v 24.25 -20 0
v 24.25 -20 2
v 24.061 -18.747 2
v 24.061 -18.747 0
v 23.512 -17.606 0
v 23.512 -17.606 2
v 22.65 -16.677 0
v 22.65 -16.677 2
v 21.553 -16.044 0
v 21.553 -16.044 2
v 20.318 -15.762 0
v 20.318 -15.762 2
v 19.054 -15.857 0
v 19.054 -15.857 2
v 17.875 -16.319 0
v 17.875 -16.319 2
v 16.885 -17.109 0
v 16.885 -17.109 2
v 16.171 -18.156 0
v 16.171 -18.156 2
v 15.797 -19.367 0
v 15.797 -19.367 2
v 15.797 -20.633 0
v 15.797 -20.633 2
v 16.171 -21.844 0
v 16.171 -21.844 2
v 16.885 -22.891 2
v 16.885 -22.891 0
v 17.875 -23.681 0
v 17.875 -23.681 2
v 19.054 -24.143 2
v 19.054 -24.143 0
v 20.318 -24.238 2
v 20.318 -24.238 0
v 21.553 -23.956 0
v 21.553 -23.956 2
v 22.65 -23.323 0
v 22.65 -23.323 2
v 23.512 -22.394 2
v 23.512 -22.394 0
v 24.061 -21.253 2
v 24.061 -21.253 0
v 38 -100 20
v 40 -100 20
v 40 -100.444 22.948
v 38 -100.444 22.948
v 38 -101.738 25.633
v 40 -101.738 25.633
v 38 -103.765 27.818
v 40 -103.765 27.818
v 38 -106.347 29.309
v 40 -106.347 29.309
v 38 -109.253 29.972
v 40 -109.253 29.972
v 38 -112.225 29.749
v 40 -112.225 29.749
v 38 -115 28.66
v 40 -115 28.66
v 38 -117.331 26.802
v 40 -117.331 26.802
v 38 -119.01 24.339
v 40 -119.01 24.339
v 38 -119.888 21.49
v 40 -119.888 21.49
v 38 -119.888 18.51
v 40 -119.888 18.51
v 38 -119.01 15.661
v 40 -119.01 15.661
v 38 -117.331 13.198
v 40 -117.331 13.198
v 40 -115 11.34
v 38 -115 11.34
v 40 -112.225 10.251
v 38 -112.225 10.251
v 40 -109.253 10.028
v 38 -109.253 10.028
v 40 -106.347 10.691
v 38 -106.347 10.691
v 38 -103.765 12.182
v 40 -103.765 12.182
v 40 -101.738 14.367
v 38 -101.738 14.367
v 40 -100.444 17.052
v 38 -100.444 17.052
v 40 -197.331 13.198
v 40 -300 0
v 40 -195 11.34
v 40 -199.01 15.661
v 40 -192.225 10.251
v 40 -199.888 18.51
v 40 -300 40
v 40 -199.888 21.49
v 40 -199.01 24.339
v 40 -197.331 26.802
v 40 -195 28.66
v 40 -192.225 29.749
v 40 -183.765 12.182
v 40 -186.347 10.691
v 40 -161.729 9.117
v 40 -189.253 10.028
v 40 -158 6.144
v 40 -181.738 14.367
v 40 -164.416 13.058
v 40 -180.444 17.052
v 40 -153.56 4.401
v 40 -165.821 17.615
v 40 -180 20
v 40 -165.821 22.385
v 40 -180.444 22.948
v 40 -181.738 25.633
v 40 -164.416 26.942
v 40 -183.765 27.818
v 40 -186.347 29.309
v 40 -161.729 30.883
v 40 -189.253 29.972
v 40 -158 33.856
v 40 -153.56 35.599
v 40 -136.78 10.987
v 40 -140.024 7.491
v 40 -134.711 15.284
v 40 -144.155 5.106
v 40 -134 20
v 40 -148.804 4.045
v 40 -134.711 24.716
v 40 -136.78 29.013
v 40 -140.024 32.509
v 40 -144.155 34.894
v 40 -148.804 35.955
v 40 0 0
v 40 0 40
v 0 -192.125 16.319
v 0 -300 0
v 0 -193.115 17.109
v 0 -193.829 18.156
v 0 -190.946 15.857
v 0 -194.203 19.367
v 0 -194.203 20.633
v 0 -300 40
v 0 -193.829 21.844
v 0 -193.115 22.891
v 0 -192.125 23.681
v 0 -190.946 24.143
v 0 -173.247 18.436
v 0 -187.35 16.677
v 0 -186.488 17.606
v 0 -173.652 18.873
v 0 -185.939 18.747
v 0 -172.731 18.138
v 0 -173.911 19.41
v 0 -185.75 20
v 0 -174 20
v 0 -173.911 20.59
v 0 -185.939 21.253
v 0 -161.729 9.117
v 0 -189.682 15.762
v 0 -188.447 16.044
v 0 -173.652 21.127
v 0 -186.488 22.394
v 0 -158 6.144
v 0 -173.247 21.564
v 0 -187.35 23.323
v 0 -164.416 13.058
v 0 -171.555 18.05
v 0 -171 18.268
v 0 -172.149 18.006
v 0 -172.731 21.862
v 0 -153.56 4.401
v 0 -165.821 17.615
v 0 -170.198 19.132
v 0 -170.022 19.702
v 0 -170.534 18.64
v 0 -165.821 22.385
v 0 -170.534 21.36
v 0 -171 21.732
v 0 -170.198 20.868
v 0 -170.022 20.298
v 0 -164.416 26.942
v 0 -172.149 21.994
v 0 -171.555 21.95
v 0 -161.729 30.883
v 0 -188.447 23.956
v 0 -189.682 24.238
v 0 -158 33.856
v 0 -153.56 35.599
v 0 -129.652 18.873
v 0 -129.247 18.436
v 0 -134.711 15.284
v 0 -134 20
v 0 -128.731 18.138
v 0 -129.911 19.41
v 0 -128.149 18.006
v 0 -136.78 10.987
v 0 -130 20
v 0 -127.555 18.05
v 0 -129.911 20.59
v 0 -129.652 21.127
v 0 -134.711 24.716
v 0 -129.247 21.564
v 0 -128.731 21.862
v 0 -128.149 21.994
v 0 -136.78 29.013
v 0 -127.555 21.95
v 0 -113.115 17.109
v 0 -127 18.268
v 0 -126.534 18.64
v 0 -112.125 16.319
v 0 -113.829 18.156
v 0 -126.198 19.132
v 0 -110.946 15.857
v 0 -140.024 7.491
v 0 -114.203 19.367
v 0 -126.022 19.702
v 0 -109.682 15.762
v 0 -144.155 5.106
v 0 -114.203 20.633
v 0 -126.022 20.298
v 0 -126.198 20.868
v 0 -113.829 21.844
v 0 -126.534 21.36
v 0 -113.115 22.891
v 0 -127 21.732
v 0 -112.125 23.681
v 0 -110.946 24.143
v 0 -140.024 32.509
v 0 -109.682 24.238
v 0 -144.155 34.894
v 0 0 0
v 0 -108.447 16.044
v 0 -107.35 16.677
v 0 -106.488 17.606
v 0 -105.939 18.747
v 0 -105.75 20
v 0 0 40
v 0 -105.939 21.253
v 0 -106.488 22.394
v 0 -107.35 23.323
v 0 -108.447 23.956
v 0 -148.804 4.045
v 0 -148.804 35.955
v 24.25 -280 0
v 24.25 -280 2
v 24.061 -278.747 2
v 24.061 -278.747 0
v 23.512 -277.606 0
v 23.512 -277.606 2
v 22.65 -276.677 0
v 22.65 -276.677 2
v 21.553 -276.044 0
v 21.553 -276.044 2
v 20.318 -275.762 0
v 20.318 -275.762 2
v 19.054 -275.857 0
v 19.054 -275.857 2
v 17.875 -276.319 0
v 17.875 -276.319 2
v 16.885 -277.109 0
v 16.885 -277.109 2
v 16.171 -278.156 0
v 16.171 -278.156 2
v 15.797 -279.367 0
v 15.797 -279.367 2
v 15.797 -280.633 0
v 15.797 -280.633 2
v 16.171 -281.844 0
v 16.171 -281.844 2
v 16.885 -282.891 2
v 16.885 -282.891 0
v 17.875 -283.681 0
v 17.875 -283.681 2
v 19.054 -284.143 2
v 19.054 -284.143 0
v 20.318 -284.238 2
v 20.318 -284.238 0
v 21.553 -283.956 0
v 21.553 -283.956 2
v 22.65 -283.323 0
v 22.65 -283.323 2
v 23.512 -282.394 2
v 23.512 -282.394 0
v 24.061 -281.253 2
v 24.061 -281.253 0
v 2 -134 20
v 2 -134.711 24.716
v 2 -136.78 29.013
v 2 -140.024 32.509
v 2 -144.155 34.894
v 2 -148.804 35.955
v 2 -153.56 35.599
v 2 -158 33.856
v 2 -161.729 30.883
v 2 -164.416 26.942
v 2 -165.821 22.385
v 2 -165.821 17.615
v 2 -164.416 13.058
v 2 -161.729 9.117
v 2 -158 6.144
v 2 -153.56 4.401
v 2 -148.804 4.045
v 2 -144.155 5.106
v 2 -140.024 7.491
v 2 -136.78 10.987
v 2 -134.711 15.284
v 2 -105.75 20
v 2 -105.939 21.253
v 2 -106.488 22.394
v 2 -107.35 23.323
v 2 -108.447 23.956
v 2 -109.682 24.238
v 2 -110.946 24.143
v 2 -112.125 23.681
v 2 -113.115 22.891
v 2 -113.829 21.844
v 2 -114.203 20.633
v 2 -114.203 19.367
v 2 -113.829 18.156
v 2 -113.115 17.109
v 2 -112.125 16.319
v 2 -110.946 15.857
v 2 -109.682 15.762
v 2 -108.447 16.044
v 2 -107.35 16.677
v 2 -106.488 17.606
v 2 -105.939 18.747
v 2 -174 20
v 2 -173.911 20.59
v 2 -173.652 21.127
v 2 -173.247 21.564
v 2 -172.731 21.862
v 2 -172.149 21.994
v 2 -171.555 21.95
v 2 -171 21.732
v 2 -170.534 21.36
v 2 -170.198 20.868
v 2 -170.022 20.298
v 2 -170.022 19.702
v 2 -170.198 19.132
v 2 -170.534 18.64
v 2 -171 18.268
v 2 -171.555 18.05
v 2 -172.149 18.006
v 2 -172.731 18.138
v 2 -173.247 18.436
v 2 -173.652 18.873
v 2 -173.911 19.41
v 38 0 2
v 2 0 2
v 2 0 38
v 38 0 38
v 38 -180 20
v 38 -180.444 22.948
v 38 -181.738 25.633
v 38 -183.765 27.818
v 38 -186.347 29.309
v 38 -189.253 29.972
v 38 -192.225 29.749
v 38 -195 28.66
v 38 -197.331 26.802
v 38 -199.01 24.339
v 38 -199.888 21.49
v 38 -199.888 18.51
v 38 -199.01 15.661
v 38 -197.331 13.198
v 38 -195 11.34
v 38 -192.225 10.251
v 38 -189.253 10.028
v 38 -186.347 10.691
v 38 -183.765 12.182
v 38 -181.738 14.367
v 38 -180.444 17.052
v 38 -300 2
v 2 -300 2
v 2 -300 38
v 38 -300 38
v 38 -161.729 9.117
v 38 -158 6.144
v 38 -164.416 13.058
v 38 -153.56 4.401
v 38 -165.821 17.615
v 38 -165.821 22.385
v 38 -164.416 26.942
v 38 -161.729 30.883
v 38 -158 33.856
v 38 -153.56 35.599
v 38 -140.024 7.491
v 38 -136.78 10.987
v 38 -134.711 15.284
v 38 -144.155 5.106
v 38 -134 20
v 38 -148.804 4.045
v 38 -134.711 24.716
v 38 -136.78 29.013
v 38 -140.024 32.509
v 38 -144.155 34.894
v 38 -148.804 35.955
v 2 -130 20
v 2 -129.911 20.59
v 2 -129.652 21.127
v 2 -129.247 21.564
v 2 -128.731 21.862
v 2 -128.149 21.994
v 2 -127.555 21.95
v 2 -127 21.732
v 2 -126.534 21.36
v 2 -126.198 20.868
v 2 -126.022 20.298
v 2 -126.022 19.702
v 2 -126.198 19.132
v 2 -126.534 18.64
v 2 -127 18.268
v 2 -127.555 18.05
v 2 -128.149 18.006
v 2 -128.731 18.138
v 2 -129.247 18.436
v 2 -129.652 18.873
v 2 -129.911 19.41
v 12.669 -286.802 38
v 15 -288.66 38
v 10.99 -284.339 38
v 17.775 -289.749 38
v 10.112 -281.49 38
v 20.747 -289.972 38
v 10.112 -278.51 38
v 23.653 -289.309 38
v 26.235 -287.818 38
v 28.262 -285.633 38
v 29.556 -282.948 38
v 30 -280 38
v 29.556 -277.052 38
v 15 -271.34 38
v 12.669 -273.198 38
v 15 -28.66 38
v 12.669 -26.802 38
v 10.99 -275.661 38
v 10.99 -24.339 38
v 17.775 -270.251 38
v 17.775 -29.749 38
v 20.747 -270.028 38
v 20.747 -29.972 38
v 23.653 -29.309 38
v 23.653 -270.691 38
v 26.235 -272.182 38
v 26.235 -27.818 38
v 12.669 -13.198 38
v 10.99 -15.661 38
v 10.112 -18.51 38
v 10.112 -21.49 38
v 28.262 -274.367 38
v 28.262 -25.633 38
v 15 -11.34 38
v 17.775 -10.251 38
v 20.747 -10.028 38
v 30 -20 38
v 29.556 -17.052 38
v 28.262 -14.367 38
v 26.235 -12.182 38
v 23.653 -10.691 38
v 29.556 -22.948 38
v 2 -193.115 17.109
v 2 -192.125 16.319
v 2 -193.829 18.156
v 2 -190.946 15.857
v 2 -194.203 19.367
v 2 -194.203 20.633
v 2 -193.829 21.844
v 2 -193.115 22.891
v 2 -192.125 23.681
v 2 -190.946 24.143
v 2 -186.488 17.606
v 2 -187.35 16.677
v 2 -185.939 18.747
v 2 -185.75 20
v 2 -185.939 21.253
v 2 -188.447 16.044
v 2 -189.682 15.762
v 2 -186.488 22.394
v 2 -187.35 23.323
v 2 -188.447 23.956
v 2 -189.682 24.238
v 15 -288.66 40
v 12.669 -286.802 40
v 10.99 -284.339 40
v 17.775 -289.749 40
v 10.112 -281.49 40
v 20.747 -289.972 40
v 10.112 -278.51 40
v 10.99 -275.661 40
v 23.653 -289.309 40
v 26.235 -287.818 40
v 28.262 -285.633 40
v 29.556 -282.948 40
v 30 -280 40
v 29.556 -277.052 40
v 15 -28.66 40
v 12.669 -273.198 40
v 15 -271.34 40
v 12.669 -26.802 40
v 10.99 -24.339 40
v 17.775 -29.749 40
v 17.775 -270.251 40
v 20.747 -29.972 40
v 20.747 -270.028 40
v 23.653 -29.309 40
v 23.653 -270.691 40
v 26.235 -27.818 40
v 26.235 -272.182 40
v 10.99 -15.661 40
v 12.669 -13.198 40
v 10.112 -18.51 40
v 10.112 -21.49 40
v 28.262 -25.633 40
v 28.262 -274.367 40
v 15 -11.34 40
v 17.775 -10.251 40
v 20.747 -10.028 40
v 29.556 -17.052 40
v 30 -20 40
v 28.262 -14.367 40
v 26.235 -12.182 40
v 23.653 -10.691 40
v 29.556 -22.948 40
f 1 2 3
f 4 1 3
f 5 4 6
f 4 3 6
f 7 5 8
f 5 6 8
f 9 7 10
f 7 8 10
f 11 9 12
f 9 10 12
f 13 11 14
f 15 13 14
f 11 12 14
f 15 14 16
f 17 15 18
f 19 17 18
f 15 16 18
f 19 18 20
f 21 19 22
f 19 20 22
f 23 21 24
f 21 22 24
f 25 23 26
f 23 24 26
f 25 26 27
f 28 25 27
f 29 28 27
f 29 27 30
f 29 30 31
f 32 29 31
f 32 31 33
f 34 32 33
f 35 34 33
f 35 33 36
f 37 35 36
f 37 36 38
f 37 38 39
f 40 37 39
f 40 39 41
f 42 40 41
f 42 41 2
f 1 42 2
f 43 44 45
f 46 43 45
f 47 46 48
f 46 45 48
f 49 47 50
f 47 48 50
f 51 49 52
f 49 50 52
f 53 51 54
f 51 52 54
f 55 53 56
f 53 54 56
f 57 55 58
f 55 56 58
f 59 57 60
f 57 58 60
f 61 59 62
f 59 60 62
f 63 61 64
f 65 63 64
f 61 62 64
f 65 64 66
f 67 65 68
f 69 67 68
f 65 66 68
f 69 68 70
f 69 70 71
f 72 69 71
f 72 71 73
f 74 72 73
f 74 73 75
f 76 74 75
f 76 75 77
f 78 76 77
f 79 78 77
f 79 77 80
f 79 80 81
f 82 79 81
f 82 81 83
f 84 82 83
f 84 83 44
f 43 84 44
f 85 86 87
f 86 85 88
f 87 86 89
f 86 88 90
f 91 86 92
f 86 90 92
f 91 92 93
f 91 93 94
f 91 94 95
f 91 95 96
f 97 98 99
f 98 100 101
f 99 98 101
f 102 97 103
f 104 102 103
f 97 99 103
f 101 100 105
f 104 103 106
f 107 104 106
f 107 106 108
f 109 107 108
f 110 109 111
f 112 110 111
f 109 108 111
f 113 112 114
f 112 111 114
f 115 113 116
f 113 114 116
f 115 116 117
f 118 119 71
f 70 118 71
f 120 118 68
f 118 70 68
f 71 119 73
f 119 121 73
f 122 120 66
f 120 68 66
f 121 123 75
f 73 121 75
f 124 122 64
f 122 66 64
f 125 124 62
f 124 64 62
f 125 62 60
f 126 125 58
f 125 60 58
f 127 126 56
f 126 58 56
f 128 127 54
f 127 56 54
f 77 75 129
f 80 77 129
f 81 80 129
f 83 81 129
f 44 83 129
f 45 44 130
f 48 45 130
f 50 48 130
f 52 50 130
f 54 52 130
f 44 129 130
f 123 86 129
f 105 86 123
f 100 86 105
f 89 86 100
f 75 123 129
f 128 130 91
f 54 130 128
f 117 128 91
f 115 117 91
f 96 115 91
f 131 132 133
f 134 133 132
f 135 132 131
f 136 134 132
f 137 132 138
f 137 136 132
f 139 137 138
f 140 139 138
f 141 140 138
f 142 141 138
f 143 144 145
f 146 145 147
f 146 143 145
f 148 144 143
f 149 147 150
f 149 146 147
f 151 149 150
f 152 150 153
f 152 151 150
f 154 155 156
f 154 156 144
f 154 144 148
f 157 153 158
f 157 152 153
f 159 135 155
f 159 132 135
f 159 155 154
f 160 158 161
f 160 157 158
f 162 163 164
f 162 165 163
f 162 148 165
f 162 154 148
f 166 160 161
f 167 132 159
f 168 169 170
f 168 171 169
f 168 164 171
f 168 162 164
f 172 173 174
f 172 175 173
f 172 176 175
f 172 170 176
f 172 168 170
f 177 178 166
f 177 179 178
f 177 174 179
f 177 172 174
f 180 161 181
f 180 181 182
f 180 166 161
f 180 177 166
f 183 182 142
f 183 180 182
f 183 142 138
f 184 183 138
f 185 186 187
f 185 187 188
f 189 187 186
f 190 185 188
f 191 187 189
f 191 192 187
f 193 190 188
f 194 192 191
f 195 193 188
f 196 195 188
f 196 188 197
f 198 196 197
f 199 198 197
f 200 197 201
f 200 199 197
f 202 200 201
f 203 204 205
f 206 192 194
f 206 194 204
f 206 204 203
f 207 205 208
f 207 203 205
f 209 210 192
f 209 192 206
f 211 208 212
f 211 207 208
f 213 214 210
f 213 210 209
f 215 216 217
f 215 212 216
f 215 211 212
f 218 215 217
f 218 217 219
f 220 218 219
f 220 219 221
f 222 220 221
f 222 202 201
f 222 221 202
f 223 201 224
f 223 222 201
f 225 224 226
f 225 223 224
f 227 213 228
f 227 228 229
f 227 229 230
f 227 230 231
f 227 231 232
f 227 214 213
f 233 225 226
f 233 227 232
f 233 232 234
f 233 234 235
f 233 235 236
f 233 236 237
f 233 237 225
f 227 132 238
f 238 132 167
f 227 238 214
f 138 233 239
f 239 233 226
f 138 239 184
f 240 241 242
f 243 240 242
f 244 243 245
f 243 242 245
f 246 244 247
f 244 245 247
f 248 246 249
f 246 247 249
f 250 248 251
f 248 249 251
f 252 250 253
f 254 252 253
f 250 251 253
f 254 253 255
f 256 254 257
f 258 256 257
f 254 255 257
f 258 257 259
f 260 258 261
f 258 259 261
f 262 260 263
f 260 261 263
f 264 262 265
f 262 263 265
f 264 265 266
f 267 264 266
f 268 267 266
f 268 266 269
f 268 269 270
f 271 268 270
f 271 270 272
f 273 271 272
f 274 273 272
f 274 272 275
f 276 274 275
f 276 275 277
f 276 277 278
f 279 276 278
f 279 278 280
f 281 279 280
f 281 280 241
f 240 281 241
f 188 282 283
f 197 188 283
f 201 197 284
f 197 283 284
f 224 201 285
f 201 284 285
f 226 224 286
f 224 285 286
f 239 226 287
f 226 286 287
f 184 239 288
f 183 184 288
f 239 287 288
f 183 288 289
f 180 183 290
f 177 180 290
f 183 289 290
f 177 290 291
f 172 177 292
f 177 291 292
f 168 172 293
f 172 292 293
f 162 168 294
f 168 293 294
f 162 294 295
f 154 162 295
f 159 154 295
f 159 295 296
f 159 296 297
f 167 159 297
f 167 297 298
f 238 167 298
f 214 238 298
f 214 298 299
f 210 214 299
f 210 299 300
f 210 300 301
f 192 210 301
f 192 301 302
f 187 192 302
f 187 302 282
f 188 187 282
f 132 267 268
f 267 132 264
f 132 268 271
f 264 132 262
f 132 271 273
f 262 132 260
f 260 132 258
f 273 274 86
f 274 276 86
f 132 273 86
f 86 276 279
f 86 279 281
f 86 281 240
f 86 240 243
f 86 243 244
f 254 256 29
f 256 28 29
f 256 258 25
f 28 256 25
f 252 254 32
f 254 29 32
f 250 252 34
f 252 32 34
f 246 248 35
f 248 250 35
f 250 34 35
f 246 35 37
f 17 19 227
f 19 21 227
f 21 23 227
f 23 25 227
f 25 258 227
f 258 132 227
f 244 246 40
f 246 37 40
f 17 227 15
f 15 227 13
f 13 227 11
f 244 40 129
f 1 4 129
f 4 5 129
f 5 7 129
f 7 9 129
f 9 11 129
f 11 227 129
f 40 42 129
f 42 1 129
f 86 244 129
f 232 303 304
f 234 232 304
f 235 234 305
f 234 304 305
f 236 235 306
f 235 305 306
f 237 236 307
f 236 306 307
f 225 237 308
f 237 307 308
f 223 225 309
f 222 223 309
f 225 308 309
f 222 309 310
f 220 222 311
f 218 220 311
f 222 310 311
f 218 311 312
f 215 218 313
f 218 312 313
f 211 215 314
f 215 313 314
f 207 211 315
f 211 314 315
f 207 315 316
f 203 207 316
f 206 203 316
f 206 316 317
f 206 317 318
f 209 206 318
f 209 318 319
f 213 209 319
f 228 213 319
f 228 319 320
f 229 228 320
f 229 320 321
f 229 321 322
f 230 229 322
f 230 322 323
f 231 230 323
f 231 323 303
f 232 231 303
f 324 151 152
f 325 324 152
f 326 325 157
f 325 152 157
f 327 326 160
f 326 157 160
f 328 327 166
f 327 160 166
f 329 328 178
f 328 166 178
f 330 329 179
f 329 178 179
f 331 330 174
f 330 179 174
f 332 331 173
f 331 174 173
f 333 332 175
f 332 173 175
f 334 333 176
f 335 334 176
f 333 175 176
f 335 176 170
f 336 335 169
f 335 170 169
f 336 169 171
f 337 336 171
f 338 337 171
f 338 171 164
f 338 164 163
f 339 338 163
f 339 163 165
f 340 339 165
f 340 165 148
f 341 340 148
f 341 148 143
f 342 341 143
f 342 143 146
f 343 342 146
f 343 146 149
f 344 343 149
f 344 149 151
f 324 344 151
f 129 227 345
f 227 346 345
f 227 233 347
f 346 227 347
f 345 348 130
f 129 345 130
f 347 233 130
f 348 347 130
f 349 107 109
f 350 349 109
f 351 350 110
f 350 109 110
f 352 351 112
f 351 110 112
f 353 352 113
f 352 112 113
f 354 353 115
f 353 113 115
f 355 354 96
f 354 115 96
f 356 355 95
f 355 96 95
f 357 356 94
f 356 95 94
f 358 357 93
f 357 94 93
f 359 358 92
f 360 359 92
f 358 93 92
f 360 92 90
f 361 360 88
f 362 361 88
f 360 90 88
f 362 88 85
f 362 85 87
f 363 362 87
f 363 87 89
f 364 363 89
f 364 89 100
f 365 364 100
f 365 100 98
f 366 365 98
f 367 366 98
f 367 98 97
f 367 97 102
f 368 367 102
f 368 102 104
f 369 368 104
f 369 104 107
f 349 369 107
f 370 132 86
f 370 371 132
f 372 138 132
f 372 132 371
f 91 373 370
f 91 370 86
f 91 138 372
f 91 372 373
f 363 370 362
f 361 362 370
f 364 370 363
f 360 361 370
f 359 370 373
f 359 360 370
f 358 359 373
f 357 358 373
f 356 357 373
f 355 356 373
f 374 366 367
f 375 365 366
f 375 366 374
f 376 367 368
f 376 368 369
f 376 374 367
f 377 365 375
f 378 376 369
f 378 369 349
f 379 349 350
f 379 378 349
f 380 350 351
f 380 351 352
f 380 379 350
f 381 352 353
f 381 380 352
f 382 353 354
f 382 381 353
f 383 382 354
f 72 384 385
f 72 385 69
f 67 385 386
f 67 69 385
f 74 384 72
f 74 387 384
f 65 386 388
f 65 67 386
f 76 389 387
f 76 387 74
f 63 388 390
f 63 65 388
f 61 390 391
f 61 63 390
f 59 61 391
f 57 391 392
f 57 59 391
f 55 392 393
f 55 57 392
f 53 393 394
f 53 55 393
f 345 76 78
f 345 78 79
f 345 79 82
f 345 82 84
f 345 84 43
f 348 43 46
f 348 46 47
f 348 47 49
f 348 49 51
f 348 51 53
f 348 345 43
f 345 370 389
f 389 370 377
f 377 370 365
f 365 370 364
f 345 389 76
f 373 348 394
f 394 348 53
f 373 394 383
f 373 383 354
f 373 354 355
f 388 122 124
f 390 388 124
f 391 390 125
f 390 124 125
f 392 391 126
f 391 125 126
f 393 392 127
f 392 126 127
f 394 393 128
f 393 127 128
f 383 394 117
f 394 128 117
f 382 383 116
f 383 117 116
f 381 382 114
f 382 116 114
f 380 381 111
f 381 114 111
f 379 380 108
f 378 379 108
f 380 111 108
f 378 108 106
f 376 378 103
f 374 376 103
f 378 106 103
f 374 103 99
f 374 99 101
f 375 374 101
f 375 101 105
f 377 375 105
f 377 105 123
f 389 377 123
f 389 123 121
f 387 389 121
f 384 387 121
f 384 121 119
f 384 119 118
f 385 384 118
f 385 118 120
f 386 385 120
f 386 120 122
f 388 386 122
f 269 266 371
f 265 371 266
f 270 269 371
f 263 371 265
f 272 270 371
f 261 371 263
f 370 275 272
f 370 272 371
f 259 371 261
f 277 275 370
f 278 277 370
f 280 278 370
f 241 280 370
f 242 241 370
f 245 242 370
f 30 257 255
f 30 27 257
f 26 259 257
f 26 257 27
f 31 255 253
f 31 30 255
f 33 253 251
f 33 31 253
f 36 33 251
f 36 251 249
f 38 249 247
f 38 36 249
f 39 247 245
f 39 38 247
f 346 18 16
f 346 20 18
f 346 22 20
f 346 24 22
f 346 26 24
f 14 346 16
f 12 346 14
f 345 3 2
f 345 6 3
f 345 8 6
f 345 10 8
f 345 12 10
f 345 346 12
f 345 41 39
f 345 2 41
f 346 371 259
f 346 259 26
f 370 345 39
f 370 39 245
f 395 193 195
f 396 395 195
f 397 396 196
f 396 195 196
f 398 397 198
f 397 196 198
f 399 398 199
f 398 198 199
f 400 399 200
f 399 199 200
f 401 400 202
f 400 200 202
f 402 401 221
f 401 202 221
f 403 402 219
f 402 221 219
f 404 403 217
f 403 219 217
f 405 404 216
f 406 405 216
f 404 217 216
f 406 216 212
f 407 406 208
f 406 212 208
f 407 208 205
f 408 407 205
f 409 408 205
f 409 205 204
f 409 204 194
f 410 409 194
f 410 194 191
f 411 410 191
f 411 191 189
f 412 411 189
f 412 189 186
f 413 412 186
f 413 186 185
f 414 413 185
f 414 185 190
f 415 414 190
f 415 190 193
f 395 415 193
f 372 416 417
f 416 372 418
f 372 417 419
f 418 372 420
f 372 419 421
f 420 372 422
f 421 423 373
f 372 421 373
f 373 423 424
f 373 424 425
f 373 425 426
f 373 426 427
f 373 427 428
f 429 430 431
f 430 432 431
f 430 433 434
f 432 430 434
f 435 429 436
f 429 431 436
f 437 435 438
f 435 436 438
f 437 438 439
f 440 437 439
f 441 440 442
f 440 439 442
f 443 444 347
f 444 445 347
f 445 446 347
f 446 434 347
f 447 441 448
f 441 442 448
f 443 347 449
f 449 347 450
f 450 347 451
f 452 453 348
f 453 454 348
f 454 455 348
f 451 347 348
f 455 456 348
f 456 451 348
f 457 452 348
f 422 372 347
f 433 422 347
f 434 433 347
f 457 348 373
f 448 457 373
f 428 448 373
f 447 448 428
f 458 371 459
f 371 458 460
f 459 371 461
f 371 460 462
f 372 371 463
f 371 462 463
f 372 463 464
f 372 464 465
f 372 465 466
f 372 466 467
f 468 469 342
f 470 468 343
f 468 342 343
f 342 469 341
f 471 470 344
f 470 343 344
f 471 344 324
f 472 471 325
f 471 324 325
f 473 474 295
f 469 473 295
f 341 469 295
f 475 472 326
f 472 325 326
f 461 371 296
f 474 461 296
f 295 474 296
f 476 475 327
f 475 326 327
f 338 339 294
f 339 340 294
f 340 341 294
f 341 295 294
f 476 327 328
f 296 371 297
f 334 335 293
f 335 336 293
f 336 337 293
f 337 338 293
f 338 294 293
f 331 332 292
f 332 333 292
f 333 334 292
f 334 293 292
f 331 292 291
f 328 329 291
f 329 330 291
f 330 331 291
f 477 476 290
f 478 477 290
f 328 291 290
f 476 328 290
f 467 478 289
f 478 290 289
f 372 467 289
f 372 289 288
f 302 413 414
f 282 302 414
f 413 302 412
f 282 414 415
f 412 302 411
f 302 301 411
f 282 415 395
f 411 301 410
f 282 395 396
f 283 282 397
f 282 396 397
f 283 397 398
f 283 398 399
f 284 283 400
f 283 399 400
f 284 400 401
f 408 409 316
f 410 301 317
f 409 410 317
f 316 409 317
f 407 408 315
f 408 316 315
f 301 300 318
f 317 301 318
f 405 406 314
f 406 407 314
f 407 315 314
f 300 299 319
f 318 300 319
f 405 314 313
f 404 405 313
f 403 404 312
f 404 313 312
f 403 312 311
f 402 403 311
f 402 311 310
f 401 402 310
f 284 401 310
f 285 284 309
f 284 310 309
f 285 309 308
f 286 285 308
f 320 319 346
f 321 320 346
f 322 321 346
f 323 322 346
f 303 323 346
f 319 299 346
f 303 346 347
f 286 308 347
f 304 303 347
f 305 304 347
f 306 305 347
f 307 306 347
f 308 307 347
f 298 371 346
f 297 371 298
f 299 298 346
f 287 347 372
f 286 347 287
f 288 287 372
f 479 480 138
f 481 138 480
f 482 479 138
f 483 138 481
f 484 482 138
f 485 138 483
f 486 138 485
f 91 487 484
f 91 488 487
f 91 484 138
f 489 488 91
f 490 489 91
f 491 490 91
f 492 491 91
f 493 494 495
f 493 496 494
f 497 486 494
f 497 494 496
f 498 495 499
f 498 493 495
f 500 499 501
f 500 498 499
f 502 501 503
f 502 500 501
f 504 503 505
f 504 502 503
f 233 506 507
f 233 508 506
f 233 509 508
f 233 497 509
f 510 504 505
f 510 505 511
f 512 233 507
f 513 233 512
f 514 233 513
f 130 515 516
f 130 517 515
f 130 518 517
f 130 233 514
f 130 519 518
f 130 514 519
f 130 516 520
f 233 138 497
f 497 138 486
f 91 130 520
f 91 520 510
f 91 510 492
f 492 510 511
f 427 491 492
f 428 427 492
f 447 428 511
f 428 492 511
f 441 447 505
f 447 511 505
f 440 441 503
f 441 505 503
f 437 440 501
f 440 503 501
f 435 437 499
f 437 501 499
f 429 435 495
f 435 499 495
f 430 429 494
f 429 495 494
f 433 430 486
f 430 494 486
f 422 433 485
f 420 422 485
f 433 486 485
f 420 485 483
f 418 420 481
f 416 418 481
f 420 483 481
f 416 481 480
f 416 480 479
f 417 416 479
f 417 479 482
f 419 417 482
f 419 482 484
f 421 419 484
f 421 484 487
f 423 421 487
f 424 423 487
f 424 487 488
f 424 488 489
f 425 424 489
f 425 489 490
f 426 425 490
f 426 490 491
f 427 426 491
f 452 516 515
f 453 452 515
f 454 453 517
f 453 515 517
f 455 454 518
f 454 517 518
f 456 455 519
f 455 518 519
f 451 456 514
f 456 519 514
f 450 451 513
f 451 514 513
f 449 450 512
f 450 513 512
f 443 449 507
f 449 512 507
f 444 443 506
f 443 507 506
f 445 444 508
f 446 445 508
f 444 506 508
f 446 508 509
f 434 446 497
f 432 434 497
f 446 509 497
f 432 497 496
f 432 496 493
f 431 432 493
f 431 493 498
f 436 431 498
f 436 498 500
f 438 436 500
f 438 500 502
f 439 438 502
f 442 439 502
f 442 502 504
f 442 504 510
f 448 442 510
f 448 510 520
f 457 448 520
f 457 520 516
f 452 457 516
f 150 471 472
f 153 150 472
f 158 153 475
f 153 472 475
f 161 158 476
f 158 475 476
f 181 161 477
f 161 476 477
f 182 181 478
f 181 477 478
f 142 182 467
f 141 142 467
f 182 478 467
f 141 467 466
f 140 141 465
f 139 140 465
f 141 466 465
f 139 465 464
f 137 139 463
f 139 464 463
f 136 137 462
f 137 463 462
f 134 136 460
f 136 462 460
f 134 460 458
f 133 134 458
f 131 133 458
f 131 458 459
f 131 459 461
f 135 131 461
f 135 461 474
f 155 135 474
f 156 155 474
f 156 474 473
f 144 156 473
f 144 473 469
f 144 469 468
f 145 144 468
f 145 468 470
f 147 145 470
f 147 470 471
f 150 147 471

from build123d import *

# Parameters (mm, degrees)
F0_W      = 40
F0_H      = 40
F0_W_2    = 36
F0_H_2    = 36
F1_DEPTH  = 300
F2_R      = 16
F2_R_2    = 10
F3_DEPTH  = 25
F4_R      = 16
F4_R_2    = 4.25
F5_DEPTH  = 25
F6_R      = 10
F7_DEPTH  = 25
F8_R      = 4.25
F9_DEPTH  = 25
F10_R     = 2
F11_DEPTH = 25


with BuildPart() as f1:
    # F0 (on Front) → F1 (new body)
    with BuildSketch(Plane.XZ):
        with Locations((20, 20)):
            Rectangle(F0_W, F0_H)
        with Locations((20, 20)):
            Rectangle(F0_W_2, F0_H_2, mode=Mode.SUBTRACT)
    extrude(amount=F1_DEPTH)

    # F2 (on face) → F3 (cut)
    with BuildSketch(Plane.YZ.offset(40)):
        with Locations((-150, 20)):
            Circle(F2_R)
        with Locations((-190, 20)):
            Circle(F2_R_2)
        with Locations((-110, 20)):
            Circle(F2_R_2)
    extrude(amount=-F3_DEPTH, mode=Mode.SUBTRACT)

    # F4 (on face) → F5 (cut)
    with BuildSketch(Plane.YZ.offset(2)):
        with Locations((-150, 20)):
            Circle(F4_R)
        with Locations((-190, 20)):
            Circle(F4_R_2)
        with Locations((-110, 20)):
            Circle(F4_R_2)
    extrude(amount=-F5_DEPTH, mode=Mode.SUBTRACT)

    # F6 (on face) → F7 (cut)
    with BuildSketch(Plane.XY.offset(40)):
        with Locations((20, -280)):
            Circle(F6_R)
        with Locations((20, -20)):
            Circle(F6_R)
    extrude(amount=-F7_DEPTH, mode=Mode.SUBTRACT)

    # F8 (on face) → F9 (cut)
    with BuildSketch(Plane.XY.offset(2)):
        with Locations((20, -280)):
            Circle(F8_R)
        with Locations((20, -20)):
            Circle(F8_R)
    extrude(amount=-F9_DEPTH, mode=Mode.SUBTRACT)

    # F10 (on face) → F11 (cut)
    with BuildSketch(Plane(origin=(0, 0, 0), x_dir=(0, -1, 0), z_dir=(-1, 0, 0))):
        with Locations((128, 20)):
            Circle(F10_R)
        with Locations((172, 20)):
            Circle(F10_R)
    extrude(amount=-F11_DEPTH, mode=Mode.SUBTRACT)


solid = f1.part
